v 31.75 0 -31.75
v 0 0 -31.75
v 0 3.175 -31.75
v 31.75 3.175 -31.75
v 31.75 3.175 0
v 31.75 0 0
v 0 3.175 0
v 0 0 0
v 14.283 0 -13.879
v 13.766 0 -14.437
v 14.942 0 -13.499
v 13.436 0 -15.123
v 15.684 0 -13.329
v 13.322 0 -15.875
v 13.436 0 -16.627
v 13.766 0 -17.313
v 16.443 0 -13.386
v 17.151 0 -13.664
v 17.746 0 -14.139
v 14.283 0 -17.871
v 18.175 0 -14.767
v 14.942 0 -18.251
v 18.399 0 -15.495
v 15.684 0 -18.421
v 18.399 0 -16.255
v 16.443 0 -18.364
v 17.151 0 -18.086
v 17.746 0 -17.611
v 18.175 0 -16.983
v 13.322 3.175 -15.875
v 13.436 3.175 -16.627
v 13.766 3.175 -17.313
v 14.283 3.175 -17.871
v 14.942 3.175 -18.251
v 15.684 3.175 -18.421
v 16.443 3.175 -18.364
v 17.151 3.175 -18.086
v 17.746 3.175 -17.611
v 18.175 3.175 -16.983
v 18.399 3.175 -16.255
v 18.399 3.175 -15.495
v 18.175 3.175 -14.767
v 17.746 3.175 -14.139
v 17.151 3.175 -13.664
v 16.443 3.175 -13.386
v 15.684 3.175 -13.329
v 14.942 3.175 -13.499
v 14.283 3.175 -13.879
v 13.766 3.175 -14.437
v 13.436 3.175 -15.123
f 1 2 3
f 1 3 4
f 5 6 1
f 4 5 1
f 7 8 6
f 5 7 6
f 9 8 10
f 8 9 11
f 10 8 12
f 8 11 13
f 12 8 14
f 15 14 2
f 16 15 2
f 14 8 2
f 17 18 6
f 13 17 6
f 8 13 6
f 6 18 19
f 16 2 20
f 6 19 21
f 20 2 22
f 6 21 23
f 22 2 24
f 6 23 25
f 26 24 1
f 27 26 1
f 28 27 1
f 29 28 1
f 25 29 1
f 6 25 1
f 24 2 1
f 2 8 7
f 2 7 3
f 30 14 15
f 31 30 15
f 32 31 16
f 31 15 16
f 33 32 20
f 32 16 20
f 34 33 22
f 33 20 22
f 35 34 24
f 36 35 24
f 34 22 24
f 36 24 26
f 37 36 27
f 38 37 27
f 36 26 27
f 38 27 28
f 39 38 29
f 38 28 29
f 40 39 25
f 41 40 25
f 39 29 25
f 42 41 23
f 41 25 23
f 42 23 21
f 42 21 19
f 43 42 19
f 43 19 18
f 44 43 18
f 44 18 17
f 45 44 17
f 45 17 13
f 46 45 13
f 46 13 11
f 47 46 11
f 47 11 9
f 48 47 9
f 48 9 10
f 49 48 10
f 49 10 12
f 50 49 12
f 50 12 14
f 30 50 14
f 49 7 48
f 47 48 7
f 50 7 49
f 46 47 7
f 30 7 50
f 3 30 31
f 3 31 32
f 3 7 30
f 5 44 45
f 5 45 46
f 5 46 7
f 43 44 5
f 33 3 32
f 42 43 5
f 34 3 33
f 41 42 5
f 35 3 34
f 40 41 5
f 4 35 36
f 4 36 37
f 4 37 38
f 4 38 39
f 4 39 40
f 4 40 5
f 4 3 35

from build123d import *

# Parameters (mm, degrees)
SKETCH1_W                   = 31.75
SKETCH1_H                   = 31.75
BOSS_EXTRUDE1_DEPTH         = 3.175
F_1_4_20_TAPPED_HOLE1_D     = 5.1054
F_1_4_20_TAPPED_HOLE1_DEPTH = 16.51
F_1_4_20_TAPPED_HOLE1_TIP   = 1.533816902


with BuildPart() as part:
    # Sketch1 → Boss-Extrude1 (new body)
    with BuildSketch(Plane(origin=(0, 0, 0), x_dir=(1, 0, 0), z_dir=(0, 1, 0))):
        with Locations((15.875, 15.875)):
            Rectangle(SKETCH1_W, SKETCH1_H)
    extrude(amount=BOSS_EXTRUDE1_DEPTH)

    # 1/4-20 Tapped Hole1
    with Locations(Plane(origin=(0, 3.175, 0), x_dir=(1, 0, 0), z_dir=(0, 1, 0))):
        with Locations((15.875, 15.875)):
            Hole(F_1_4_20_TAPPED_HOLE1_D / 2, depth=F_1_4_20_TAPPED_HOLE1_DEPTH)
            with Locations((0, 0, -(F_1_4_20_TAPPED_HOLE1_DEPTH + F_1_4_20_TAPPED_HOLE1_TIP / 2))):  # 118° drill point
                Cone(0, F_1_4_20_TAPPED_HOLE1_D / 2, F_1_4_20_TAPPED_HOLE1_TIP, mode=Mode.SUBTRACT)


solid = part.part
